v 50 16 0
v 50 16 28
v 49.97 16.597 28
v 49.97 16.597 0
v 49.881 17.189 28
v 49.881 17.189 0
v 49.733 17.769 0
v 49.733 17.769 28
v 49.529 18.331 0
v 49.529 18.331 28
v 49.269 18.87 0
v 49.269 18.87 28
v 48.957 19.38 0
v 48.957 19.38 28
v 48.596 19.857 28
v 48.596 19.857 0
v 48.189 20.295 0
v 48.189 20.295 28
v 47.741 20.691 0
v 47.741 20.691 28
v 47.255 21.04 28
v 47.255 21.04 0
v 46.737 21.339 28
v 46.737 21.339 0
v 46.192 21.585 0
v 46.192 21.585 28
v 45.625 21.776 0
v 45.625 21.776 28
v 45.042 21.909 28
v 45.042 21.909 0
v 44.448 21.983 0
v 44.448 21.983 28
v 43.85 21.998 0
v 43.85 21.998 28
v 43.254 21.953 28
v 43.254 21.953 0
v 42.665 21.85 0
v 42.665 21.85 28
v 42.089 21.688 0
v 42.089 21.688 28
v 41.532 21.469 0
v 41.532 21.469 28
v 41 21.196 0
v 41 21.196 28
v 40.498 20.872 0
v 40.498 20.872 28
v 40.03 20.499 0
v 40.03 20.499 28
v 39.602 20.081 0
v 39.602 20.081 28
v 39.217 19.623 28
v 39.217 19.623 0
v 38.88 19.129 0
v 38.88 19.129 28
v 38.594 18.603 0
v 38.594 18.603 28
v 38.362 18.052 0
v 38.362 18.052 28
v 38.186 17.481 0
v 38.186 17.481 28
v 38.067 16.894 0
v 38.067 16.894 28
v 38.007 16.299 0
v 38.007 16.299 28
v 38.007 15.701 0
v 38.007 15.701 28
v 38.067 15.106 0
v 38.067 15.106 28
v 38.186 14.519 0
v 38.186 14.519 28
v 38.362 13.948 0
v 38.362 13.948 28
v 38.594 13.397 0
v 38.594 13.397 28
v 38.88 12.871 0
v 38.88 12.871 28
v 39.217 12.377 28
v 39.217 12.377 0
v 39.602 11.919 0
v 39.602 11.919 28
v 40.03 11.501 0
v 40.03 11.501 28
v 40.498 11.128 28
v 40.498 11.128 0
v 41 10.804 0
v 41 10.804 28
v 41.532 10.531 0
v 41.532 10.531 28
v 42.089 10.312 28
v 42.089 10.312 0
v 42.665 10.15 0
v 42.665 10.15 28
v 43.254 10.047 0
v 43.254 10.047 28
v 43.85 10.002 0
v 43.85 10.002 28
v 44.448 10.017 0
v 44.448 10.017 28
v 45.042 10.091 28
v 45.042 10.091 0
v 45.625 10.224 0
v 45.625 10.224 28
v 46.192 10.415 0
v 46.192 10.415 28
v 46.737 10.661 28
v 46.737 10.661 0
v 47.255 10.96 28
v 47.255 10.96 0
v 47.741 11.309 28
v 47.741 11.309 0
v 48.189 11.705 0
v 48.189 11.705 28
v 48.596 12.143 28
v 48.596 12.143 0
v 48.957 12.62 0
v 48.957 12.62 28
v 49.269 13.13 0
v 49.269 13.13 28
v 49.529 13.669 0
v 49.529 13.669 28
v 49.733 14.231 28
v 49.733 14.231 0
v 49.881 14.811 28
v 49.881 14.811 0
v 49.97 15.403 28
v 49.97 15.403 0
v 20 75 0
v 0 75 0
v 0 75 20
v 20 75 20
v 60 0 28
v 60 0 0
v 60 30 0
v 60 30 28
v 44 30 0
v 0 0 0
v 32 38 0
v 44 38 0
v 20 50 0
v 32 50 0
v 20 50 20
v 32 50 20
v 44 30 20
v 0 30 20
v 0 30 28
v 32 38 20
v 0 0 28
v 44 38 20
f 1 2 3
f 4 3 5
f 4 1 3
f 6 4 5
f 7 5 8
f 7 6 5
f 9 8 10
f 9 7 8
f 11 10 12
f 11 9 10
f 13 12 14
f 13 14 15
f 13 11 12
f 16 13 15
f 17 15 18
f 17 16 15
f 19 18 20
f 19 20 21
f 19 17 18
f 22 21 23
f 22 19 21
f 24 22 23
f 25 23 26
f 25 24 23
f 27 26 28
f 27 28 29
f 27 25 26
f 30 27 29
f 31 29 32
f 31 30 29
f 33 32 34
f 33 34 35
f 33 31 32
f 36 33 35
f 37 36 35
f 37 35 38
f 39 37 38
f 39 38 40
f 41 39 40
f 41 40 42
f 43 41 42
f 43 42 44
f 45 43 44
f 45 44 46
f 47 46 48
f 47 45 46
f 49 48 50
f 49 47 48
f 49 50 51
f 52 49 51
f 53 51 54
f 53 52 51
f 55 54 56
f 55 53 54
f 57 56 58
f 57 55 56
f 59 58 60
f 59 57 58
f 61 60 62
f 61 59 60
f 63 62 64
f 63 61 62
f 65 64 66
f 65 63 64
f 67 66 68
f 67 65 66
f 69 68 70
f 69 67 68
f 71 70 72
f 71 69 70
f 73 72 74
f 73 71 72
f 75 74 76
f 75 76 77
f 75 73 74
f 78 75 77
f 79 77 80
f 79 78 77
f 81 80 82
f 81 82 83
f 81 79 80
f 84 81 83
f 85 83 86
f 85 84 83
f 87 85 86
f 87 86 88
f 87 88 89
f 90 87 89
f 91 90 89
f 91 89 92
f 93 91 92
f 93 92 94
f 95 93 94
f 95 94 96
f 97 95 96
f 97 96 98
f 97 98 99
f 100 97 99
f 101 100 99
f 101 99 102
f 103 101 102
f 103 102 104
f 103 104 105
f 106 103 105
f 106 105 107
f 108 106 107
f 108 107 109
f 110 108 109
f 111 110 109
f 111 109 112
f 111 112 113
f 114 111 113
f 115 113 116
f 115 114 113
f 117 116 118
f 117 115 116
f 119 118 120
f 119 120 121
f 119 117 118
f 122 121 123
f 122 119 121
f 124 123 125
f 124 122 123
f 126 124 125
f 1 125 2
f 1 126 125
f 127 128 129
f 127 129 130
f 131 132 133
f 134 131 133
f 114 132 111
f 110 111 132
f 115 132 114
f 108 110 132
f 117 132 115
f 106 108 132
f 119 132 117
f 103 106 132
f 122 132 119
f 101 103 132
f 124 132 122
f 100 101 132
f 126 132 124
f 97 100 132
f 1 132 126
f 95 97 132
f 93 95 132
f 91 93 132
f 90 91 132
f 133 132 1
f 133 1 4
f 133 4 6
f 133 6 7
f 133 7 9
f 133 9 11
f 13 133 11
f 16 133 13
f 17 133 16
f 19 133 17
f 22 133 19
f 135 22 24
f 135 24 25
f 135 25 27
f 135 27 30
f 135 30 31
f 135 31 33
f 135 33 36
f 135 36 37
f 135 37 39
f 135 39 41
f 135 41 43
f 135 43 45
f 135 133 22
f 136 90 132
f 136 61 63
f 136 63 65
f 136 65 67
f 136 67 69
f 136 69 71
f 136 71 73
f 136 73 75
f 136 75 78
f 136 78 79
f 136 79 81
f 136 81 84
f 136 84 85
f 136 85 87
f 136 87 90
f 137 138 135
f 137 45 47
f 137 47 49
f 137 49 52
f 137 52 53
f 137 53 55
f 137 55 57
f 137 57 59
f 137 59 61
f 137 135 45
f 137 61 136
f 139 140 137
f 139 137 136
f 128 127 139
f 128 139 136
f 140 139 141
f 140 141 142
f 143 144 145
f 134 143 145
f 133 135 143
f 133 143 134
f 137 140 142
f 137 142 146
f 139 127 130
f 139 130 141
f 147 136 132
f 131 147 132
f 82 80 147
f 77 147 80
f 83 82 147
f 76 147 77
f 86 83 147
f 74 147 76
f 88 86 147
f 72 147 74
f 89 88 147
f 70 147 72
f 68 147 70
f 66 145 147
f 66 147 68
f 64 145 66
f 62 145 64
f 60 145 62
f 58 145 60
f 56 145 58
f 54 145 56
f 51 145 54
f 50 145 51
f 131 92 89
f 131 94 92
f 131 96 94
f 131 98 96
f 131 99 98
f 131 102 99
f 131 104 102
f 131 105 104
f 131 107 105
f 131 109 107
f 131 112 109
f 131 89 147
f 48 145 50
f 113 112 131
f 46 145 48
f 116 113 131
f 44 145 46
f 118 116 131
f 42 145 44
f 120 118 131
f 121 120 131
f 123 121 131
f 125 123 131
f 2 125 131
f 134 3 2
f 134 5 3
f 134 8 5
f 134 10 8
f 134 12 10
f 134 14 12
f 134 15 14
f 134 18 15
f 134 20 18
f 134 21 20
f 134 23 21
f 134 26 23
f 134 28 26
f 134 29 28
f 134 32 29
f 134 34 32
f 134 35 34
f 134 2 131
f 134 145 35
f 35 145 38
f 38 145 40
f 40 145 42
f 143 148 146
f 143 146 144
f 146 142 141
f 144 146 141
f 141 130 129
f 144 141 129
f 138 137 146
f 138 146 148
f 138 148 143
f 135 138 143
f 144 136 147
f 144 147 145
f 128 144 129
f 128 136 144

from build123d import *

# Parameters (mm, degrees)
SKETCH1_W           = 60
SKETCH1_H           = 30
SKETCH1_R           = 6
BOSS_EXTRUDE1_DEPTH = 28
BOSS_EXTRUDE2_DEPTH = 20


with BuildPart() as part:
    # Sketch1 → Boss-Extrude1 (new body)
    with BuildSketch(Plane.XY):
        with Locations((30, 15)):
            Rectangle(SKETCH1_W, SKETCH1_H)
        with Locations((44, 16)):
            Circle(SKETCH1_R, mode=Mode.SUBTRACT)
    extrude(amount=BOSS_EXTRUDE1_DEPTH)

    # Sketch3 → Boss-Extrude2 (add)
    with BuildSketch(Plane.XY):
        Polygon((0, 30), (0, 75), (20, 75), (20, 50), (32, 50), (32, 38), (44, 38), (44, 30), align=None)
    extrude(amount=BOSS_EXTRUDE2_DEPTH)


solid = part.part
